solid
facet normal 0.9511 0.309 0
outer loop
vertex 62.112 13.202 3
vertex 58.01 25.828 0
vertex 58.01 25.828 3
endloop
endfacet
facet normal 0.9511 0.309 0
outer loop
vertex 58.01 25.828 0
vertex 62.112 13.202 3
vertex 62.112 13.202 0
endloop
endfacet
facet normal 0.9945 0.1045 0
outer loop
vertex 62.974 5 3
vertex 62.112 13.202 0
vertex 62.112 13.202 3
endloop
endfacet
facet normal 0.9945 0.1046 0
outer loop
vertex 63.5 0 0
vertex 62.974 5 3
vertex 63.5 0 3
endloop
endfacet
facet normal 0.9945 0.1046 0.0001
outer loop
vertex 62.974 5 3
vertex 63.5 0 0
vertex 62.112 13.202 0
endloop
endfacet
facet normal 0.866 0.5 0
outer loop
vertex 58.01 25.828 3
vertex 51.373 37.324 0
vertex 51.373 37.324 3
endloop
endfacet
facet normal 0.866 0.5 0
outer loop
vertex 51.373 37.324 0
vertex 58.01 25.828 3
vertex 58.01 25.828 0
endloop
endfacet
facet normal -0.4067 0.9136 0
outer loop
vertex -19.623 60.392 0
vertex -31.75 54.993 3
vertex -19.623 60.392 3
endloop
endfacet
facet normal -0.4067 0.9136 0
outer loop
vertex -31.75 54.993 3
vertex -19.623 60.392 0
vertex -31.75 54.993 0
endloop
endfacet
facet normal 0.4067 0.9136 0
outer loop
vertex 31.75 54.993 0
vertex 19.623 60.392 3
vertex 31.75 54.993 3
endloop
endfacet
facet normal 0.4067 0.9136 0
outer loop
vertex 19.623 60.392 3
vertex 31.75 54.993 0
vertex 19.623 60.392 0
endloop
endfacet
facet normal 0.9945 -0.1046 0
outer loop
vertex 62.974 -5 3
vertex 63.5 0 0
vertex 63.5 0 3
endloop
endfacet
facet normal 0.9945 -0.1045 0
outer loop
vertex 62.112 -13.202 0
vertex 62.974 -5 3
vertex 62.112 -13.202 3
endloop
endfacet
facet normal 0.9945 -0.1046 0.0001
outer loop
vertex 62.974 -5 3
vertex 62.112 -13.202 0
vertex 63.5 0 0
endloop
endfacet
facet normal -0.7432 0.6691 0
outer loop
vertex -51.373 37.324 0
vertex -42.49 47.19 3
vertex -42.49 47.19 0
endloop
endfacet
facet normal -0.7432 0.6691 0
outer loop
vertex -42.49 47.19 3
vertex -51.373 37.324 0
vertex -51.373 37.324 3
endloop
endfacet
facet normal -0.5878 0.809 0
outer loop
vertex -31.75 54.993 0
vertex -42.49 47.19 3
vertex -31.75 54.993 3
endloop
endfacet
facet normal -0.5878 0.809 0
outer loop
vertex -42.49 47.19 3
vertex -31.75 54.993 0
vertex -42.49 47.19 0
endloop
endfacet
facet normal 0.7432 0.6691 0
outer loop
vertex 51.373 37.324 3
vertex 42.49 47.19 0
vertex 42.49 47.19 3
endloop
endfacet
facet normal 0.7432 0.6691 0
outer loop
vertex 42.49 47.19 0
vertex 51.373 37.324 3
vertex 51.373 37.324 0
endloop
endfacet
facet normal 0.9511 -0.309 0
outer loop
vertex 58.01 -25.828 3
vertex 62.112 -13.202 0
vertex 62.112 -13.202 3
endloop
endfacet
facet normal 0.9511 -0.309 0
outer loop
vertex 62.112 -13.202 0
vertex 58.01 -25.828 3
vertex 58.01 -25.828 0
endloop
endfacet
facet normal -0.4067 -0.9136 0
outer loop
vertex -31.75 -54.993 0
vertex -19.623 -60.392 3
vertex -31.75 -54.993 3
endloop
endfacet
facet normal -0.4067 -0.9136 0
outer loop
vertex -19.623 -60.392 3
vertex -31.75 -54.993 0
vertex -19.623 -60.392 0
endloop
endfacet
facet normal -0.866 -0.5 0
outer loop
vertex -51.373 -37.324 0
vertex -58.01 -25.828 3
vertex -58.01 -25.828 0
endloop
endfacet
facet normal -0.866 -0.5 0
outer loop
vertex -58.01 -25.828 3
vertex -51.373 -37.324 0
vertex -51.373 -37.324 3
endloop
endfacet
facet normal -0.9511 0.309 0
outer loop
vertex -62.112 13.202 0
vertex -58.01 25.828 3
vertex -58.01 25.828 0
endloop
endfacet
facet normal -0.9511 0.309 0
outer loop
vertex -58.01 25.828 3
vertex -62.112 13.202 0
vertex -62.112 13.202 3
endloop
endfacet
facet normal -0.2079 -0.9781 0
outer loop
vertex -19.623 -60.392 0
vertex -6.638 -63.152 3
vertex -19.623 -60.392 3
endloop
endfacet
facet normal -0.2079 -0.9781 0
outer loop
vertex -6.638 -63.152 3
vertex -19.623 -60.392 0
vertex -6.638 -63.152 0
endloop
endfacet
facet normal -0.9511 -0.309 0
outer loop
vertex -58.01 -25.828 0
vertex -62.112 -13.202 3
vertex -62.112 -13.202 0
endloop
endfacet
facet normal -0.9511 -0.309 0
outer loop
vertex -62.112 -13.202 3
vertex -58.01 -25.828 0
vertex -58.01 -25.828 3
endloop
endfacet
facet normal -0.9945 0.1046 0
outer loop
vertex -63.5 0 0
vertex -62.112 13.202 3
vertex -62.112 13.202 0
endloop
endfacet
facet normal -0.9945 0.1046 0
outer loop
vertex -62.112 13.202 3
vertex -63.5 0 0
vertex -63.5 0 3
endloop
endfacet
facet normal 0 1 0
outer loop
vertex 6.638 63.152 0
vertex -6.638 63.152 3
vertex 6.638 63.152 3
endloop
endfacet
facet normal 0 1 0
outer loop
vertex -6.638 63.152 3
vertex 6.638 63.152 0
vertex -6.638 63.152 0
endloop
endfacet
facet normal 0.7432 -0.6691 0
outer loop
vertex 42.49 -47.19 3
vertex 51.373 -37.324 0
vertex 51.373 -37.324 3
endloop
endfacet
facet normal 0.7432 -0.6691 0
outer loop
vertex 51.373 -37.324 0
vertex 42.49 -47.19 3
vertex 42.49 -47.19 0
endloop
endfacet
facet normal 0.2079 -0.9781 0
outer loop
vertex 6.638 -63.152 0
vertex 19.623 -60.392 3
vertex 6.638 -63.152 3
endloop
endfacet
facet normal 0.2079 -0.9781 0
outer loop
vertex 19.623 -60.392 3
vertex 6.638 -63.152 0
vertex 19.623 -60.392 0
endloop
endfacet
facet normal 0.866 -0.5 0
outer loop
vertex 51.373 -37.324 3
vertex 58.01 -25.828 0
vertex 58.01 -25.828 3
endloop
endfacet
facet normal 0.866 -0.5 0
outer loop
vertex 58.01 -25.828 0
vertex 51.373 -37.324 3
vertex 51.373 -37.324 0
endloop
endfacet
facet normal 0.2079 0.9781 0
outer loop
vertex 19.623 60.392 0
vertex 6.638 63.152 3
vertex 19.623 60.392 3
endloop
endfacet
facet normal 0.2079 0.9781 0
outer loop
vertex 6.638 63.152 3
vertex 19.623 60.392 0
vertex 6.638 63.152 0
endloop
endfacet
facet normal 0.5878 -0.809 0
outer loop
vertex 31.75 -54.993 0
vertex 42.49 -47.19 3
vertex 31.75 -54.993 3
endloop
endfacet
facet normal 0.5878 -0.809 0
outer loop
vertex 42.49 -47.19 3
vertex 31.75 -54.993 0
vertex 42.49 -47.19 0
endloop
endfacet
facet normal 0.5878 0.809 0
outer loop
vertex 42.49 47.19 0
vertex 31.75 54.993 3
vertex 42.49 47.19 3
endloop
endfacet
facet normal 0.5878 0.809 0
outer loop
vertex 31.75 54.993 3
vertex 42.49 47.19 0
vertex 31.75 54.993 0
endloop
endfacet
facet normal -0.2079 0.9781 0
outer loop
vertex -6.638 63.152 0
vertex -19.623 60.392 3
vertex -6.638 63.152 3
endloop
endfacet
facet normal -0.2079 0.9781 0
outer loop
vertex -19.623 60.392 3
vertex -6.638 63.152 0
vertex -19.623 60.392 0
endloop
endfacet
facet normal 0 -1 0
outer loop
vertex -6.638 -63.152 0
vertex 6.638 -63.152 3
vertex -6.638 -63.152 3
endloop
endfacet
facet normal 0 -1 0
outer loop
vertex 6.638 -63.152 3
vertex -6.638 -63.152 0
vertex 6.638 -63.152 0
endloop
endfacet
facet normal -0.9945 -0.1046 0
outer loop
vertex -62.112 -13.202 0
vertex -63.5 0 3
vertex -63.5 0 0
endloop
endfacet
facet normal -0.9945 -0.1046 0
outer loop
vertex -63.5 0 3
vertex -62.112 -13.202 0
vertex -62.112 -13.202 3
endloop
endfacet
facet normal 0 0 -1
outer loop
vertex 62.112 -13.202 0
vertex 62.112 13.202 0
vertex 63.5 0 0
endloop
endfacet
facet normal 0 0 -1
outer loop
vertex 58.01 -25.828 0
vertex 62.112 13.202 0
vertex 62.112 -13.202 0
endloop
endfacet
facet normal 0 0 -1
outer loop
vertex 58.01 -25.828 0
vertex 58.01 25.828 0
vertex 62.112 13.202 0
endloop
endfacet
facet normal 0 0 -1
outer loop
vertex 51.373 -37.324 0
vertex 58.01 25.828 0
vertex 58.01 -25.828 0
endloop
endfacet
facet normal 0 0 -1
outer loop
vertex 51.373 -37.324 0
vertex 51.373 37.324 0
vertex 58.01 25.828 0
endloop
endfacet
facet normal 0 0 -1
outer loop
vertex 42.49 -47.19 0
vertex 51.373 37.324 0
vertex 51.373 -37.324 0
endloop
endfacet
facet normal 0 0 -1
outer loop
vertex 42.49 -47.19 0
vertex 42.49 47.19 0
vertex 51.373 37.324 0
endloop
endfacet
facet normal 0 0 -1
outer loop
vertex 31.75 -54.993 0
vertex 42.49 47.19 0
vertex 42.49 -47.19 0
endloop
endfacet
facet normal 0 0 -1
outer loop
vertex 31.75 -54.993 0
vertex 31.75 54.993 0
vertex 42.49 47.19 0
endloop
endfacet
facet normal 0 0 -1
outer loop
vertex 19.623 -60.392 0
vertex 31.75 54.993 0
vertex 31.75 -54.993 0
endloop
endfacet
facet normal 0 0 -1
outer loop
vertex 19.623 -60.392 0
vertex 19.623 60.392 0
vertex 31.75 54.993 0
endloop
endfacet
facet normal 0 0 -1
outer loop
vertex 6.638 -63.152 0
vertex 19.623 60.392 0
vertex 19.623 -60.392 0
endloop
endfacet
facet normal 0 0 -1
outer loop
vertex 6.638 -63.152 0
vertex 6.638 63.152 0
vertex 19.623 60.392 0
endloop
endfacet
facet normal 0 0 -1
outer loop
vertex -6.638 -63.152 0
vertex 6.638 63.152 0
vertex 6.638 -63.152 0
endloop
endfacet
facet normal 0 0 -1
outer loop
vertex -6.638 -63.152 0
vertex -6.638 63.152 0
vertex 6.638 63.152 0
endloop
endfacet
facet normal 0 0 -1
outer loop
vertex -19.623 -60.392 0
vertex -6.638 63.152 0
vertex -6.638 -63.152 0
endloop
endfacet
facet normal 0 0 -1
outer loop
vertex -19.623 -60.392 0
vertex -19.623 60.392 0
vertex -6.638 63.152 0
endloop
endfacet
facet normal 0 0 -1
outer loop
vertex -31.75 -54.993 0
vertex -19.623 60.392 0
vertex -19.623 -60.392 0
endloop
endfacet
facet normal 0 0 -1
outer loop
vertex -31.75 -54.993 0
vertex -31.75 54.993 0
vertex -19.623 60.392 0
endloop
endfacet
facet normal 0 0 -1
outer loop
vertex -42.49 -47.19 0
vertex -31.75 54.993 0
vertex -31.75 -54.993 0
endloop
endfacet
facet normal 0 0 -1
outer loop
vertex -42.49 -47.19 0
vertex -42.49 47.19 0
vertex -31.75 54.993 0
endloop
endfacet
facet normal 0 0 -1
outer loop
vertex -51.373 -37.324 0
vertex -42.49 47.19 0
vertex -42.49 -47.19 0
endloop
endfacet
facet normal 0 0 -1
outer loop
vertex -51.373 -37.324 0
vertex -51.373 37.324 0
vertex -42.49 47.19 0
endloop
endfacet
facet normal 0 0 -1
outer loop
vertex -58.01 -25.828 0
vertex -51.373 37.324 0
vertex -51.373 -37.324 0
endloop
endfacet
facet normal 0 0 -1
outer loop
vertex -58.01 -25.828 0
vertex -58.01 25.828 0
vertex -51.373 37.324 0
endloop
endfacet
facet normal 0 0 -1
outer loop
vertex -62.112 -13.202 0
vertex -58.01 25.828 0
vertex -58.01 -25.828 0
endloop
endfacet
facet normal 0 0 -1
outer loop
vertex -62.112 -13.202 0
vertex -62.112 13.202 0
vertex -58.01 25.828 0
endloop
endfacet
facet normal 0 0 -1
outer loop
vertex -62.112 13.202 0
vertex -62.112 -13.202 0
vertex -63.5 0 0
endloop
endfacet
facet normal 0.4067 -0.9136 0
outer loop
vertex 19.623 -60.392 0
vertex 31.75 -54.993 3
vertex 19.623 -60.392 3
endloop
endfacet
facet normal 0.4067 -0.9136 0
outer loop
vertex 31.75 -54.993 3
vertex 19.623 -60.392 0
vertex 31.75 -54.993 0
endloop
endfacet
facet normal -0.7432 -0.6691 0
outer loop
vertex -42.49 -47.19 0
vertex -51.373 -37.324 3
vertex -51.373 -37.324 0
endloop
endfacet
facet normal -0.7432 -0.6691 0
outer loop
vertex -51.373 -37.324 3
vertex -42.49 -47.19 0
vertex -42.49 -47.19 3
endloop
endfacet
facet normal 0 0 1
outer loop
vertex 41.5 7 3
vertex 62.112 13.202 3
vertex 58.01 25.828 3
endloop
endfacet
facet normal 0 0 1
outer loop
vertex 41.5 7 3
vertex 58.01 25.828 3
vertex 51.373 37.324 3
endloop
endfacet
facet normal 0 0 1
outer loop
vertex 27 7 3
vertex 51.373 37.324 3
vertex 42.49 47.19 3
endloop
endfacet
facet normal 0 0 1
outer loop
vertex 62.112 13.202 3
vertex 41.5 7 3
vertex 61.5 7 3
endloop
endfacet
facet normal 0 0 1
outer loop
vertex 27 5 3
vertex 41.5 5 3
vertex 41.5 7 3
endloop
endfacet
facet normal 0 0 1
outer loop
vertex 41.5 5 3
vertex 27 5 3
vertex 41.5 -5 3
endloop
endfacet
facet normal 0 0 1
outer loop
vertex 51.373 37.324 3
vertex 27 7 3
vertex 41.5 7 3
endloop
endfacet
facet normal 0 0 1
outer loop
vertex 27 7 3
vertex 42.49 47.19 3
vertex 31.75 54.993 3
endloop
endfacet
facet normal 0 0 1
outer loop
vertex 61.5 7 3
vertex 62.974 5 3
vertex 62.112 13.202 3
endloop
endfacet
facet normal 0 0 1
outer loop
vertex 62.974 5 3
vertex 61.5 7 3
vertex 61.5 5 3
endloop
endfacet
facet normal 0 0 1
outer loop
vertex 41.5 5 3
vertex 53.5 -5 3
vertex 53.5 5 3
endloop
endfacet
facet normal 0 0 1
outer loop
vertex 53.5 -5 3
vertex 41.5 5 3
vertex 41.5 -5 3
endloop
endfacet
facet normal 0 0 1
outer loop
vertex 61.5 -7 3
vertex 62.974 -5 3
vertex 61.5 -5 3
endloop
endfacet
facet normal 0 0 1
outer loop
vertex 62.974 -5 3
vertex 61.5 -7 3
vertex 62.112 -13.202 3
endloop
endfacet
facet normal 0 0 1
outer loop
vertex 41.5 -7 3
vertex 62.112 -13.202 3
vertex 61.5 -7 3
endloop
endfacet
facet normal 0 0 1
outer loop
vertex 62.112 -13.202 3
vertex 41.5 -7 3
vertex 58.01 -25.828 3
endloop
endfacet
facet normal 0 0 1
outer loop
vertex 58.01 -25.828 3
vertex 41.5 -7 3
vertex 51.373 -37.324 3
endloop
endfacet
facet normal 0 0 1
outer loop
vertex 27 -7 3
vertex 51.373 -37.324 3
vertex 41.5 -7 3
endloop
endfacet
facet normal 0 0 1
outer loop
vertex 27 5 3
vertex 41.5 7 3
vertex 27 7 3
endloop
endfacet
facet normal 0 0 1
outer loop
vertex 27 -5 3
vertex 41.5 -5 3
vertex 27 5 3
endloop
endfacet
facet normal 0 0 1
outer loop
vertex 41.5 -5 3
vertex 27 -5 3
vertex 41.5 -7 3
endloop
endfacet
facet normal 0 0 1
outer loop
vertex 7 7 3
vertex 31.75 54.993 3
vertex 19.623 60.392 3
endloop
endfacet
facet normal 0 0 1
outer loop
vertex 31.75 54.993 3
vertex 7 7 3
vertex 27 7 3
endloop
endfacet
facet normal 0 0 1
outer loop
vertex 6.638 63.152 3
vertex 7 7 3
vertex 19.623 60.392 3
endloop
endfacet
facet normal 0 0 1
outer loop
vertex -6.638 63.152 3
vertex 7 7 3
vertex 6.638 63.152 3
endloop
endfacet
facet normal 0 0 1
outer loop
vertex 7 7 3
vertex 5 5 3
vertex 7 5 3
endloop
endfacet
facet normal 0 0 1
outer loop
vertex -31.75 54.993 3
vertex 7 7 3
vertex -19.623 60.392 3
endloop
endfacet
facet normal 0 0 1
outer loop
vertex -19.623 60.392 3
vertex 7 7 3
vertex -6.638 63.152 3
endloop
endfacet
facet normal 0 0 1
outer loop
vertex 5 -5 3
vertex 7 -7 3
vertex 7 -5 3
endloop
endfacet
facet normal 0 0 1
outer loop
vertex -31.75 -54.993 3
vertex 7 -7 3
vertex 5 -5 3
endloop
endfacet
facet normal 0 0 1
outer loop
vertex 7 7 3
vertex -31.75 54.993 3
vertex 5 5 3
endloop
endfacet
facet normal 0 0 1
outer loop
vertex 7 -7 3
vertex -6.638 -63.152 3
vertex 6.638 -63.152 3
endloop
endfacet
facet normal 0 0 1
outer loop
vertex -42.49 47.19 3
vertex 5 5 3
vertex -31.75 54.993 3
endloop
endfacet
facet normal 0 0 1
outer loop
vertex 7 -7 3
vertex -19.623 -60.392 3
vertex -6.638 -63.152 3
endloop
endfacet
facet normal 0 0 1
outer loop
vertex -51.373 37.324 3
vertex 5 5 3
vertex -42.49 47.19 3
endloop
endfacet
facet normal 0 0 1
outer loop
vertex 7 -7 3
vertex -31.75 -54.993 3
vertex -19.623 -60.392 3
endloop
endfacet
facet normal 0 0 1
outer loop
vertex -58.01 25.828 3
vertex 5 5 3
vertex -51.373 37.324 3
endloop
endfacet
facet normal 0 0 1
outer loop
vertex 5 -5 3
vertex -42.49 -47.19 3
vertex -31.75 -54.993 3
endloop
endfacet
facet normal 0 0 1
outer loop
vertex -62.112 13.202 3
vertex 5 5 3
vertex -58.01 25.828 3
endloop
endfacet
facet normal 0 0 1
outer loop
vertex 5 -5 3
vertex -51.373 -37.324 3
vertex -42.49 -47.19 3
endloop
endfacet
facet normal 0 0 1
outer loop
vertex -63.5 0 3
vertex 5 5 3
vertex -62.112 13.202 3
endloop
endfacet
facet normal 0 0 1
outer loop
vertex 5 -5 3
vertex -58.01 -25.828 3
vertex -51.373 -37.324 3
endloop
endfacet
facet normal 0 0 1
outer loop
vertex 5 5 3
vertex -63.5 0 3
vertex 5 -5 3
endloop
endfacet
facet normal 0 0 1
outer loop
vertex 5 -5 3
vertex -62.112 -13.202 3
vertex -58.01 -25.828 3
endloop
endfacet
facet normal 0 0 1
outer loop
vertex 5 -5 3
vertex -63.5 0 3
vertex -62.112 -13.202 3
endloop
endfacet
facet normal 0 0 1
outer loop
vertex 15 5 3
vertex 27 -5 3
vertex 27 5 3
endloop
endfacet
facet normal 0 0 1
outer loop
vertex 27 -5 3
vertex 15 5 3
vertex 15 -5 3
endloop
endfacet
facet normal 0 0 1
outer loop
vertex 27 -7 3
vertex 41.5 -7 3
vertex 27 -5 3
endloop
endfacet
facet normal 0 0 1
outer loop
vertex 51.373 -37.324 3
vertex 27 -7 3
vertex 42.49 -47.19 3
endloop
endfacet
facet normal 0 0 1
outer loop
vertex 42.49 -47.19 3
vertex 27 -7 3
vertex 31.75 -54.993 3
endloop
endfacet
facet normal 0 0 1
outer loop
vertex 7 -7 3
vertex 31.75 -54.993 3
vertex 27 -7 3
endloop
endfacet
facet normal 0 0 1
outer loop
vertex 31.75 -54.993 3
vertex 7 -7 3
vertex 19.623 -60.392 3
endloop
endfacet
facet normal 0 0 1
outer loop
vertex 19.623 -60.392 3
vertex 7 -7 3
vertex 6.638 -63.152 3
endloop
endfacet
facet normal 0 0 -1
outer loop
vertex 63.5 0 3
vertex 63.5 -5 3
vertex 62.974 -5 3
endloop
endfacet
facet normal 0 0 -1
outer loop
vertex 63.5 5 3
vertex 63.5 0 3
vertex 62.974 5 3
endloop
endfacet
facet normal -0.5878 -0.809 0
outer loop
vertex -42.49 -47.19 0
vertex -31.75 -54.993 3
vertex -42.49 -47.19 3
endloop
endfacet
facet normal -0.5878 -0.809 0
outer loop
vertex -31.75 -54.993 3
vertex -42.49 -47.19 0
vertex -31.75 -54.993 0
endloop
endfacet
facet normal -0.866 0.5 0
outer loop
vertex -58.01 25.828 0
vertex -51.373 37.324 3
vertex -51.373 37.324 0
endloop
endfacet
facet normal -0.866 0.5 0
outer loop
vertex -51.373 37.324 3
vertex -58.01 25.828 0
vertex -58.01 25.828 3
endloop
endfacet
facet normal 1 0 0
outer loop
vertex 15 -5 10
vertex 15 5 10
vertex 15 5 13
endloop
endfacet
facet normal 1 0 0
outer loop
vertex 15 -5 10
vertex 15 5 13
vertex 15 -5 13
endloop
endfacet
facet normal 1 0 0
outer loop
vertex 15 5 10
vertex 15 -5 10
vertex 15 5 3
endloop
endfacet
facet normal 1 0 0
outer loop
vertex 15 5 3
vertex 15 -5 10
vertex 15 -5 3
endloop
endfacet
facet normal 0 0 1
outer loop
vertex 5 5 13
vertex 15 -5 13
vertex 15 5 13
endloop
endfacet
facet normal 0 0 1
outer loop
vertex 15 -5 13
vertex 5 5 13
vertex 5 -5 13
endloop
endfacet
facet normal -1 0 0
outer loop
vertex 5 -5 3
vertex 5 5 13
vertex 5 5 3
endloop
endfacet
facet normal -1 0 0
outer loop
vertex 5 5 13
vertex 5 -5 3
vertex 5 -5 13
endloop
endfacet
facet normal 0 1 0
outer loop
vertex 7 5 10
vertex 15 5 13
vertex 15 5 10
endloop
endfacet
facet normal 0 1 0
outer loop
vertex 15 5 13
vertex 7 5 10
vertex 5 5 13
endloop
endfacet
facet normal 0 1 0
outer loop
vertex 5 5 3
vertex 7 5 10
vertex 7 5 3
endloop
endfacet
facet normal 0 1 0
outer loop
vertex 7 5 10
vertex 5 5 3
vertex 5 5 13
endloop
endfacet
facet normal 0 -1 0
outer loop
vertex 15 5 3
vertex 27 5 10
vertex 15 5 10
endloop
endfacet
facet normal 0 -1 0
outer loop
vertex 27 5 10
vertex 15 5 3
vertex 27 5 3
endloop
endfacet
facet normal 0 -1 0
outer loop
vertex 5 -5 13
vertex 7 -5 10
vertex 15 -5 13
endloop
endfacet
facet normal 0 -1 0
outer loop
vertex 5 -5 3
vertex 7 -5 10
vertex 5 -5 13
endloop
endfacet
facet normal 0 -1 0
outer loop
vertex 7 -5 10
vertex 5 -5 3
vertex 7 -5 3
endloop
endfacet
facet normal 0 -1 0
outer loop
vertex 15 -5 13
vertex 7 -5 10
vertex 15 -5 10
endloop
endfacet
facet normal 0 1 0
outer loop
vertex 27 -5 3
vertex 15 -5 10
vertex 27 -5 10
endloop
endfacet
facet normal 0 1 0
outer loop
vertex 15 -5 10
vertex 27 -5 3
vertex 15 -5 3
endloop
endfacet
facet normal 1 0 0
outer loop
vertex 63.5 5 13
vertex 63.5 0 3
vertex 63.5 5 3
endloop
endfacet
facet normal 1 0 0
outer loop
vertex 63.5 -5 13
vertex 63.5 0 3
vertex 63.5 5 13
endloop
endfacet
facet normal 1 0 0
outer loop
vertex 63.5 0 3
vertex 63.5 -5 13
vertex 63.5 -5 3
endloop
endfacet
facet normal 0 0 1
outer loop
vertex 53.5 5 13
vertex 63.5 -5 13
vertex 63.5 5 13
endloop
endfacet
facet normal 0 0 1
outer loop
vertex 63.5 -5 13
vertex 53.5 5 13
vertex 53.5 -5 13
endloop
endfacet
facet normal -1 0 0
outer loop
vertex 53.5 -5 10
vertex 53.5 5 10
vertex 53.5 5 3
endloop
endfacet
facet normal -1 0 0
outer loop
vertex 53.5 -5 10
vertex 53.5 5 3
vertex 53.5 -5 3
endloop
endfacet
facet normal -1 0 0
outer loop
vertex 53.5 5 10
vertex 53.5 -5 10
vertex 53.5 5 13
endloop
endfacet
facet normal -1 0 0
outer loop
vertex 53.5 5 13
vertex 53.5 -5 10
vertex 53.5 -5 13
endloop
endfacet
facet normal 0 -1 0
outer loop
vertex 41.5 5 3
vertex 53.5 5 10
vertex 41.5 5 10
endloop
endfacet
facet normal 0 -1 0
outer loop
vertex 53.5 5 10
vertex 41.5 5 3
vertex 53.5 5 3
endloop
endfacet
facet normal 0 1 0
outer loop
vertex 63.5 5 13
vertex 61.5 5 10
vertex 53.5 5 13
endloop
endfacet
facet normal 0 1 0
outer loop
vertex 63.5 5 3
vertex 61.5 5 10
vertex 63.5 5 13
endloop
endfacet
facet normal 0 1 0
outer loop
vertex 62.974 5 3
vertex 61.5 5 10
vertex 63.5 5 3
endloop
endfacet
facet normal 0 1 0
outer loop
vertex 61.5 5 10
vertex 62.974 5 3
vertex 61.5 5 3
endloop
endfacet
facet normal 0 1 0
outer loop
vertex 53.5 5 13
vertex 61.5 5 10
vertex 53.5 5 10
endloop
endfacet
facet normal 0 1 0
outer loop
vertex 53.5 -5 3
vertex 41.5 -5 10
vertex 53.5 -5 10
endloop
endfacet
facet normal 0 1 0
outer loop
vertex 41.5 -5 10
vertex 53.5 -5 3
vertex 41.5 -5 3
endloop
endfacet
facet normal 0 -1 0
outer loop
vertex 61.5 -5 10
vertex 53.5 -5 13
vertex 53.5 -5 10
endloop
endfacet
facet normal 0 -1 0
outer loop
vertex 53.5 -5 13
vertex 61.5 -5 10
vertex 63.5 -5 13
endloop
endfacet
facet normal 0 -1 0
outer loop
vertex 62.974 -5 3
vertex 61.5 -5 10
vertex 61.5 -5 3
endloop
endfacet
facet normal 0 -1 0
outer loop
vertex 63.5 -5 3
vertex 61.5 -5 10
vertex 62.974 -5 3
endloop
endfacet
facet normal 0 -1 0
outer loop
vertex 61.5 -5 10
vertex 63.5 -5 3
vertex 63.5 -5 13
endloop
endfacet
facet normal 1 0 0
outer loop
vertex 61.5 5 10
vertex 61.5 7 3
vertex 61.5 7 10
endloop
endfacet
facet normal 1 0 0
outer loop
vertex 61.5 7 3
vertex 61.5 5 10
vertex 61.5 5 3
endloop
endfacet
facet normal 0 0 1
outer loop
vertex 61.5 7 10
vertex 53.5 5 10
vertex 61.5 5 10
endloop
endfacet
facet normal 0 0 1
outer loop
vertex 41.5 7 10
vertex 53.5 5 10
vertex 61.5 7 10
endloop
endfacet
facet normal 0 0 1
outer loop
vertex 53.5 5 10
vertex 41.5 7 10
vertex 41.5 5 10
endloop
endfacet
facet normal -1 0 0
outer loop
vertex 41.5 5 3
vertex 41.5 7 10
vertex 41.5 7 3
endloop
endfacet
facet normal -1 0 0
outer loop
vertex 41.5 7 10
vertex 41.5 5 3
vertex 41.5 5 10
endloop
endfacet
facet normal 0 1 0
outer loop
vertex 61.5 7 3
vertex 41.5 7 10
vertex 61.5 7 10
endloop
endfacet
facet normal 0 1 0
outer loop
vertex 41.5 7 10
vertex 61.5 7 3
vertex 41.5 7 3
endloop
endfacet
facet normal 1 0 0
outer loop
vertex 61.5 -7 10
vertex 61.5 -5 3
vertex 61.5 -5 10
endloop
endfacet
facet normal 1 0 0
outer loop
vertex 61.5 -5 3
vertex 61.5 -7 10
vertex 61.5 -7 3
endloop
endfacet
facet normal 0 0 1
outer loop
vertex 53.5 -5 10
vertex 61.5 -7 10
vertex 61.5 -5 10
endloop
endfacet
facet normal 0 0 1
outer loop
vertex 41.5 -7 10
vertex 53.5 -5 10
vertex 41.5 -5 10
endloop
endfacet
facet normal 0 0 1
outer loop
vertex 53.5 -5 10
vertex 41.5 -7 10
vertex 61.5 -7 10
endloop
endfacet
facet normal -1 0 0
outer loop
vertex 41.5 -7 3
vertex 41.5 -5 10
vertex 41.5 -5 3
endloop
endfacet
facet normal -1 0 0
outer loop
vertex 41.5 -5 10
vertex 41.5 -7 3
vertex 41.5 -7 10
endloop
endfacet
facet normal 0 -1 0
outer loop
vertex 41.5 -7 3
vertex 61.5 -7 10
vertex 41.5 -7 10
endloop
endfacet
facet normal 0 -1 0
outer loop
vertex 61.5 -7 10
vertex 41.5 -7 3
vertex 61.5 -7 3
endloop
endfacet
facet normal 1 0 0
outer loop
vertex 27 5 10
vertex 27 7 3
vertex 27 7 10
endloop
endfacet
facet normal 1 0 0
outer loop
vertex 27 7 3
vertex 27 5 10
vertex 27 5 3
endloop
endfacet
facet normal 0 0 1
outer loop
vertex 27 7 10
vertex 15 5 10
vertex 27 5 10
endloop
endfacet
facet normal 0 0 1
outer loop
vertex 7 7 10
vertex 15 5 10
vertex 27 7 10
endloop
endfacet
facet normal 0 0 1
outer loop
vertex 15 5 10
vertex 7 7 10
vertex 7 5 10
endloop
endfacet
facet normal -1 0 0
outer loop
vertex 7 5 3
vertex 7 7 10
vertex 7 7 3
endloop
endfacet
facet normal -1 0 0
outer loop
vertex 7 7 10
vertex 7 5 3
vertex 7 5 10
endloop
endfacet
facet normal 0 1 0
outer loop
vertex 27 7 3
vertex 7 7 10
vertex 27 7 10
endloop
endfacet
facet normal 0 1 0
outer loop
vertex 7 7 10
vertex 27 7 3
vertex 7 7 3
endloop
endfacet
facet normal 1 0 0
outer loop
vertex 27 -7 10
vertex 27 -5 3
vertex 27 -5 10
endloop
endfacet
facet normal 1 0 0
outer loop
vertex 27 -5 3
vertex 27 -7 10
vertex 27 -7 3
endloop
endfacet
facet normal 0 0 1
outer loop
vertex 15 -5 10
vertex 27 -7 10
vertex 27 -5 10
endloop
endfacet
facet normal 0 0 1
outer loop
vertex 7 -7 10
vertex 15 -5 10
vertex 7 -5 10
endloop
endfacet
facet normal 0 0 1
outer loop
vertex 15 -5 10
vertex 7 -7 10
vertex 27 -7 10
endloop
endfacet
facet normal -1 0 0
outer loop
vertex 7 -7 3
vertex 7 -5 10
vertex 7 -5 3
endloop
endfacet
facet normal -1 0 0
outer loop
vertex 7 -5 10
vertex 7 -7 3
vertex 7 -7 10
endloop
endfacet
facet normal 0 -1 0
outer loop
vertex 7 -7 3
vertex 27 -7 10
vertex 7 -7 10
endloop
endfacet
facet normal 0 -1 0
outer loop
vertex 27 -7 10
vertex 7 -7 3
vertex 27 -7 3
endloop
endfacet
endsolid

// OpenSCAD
PlateRadius=5*25.4/2;
PlateHeight=3;

StickDia=10;    // for 10x10 stick

HolderLen=20;   // length of stick holder
HolderHeight=8; // height of stick holder
HolderWid=2;    // width of stick holder

color([.1,.1,.1,.1]) cylinder(h=PlateHeight, r=PlateRadius);

LightGray=[.2,.2,.9,.2];

//----------------------------------------------------------------------
// reference cubes
//----------------------------------------------------------------------

module refCube()
    color(LightGray) cube([StickDia,StickDia,StickDia]);

// center and each end of the stick
//translate([-StickDia/2,-StickDia/2,0+PlateHeight]) refCube();
translate([StickDia/2,-StickDia/2,0+PlateHeight]) refCube();
translate([PlateRadius-StickDia,-StickDia/2,0+PlateHeight]) refCube();

//----------------------------------------------------------------------
// end holders , inside and outside
//----------------------------------------------------------------------

translate([PlateRadius-HolderLen-2,StickDia/2,2])
    color("red") cube([HolderLen,HolderWid,HolderHeight]);

translate([PlateRadius-HolderLen-2,-HolderWid-StickDia/2,2]) {
    color("blue") cube([HolderLen,HolderWid,HolderHeight]);
}

translate([StickDia/2+2,StickDia/2,2])
    color("red") cube([HolderLen,HolderWid,HolderHeight]);

translate([StickDia/2+2,-HolderWid-StickDia/2,2]) {
    color("blue") cube([HolderLen,HolderWid,HolderHeight]);
}
